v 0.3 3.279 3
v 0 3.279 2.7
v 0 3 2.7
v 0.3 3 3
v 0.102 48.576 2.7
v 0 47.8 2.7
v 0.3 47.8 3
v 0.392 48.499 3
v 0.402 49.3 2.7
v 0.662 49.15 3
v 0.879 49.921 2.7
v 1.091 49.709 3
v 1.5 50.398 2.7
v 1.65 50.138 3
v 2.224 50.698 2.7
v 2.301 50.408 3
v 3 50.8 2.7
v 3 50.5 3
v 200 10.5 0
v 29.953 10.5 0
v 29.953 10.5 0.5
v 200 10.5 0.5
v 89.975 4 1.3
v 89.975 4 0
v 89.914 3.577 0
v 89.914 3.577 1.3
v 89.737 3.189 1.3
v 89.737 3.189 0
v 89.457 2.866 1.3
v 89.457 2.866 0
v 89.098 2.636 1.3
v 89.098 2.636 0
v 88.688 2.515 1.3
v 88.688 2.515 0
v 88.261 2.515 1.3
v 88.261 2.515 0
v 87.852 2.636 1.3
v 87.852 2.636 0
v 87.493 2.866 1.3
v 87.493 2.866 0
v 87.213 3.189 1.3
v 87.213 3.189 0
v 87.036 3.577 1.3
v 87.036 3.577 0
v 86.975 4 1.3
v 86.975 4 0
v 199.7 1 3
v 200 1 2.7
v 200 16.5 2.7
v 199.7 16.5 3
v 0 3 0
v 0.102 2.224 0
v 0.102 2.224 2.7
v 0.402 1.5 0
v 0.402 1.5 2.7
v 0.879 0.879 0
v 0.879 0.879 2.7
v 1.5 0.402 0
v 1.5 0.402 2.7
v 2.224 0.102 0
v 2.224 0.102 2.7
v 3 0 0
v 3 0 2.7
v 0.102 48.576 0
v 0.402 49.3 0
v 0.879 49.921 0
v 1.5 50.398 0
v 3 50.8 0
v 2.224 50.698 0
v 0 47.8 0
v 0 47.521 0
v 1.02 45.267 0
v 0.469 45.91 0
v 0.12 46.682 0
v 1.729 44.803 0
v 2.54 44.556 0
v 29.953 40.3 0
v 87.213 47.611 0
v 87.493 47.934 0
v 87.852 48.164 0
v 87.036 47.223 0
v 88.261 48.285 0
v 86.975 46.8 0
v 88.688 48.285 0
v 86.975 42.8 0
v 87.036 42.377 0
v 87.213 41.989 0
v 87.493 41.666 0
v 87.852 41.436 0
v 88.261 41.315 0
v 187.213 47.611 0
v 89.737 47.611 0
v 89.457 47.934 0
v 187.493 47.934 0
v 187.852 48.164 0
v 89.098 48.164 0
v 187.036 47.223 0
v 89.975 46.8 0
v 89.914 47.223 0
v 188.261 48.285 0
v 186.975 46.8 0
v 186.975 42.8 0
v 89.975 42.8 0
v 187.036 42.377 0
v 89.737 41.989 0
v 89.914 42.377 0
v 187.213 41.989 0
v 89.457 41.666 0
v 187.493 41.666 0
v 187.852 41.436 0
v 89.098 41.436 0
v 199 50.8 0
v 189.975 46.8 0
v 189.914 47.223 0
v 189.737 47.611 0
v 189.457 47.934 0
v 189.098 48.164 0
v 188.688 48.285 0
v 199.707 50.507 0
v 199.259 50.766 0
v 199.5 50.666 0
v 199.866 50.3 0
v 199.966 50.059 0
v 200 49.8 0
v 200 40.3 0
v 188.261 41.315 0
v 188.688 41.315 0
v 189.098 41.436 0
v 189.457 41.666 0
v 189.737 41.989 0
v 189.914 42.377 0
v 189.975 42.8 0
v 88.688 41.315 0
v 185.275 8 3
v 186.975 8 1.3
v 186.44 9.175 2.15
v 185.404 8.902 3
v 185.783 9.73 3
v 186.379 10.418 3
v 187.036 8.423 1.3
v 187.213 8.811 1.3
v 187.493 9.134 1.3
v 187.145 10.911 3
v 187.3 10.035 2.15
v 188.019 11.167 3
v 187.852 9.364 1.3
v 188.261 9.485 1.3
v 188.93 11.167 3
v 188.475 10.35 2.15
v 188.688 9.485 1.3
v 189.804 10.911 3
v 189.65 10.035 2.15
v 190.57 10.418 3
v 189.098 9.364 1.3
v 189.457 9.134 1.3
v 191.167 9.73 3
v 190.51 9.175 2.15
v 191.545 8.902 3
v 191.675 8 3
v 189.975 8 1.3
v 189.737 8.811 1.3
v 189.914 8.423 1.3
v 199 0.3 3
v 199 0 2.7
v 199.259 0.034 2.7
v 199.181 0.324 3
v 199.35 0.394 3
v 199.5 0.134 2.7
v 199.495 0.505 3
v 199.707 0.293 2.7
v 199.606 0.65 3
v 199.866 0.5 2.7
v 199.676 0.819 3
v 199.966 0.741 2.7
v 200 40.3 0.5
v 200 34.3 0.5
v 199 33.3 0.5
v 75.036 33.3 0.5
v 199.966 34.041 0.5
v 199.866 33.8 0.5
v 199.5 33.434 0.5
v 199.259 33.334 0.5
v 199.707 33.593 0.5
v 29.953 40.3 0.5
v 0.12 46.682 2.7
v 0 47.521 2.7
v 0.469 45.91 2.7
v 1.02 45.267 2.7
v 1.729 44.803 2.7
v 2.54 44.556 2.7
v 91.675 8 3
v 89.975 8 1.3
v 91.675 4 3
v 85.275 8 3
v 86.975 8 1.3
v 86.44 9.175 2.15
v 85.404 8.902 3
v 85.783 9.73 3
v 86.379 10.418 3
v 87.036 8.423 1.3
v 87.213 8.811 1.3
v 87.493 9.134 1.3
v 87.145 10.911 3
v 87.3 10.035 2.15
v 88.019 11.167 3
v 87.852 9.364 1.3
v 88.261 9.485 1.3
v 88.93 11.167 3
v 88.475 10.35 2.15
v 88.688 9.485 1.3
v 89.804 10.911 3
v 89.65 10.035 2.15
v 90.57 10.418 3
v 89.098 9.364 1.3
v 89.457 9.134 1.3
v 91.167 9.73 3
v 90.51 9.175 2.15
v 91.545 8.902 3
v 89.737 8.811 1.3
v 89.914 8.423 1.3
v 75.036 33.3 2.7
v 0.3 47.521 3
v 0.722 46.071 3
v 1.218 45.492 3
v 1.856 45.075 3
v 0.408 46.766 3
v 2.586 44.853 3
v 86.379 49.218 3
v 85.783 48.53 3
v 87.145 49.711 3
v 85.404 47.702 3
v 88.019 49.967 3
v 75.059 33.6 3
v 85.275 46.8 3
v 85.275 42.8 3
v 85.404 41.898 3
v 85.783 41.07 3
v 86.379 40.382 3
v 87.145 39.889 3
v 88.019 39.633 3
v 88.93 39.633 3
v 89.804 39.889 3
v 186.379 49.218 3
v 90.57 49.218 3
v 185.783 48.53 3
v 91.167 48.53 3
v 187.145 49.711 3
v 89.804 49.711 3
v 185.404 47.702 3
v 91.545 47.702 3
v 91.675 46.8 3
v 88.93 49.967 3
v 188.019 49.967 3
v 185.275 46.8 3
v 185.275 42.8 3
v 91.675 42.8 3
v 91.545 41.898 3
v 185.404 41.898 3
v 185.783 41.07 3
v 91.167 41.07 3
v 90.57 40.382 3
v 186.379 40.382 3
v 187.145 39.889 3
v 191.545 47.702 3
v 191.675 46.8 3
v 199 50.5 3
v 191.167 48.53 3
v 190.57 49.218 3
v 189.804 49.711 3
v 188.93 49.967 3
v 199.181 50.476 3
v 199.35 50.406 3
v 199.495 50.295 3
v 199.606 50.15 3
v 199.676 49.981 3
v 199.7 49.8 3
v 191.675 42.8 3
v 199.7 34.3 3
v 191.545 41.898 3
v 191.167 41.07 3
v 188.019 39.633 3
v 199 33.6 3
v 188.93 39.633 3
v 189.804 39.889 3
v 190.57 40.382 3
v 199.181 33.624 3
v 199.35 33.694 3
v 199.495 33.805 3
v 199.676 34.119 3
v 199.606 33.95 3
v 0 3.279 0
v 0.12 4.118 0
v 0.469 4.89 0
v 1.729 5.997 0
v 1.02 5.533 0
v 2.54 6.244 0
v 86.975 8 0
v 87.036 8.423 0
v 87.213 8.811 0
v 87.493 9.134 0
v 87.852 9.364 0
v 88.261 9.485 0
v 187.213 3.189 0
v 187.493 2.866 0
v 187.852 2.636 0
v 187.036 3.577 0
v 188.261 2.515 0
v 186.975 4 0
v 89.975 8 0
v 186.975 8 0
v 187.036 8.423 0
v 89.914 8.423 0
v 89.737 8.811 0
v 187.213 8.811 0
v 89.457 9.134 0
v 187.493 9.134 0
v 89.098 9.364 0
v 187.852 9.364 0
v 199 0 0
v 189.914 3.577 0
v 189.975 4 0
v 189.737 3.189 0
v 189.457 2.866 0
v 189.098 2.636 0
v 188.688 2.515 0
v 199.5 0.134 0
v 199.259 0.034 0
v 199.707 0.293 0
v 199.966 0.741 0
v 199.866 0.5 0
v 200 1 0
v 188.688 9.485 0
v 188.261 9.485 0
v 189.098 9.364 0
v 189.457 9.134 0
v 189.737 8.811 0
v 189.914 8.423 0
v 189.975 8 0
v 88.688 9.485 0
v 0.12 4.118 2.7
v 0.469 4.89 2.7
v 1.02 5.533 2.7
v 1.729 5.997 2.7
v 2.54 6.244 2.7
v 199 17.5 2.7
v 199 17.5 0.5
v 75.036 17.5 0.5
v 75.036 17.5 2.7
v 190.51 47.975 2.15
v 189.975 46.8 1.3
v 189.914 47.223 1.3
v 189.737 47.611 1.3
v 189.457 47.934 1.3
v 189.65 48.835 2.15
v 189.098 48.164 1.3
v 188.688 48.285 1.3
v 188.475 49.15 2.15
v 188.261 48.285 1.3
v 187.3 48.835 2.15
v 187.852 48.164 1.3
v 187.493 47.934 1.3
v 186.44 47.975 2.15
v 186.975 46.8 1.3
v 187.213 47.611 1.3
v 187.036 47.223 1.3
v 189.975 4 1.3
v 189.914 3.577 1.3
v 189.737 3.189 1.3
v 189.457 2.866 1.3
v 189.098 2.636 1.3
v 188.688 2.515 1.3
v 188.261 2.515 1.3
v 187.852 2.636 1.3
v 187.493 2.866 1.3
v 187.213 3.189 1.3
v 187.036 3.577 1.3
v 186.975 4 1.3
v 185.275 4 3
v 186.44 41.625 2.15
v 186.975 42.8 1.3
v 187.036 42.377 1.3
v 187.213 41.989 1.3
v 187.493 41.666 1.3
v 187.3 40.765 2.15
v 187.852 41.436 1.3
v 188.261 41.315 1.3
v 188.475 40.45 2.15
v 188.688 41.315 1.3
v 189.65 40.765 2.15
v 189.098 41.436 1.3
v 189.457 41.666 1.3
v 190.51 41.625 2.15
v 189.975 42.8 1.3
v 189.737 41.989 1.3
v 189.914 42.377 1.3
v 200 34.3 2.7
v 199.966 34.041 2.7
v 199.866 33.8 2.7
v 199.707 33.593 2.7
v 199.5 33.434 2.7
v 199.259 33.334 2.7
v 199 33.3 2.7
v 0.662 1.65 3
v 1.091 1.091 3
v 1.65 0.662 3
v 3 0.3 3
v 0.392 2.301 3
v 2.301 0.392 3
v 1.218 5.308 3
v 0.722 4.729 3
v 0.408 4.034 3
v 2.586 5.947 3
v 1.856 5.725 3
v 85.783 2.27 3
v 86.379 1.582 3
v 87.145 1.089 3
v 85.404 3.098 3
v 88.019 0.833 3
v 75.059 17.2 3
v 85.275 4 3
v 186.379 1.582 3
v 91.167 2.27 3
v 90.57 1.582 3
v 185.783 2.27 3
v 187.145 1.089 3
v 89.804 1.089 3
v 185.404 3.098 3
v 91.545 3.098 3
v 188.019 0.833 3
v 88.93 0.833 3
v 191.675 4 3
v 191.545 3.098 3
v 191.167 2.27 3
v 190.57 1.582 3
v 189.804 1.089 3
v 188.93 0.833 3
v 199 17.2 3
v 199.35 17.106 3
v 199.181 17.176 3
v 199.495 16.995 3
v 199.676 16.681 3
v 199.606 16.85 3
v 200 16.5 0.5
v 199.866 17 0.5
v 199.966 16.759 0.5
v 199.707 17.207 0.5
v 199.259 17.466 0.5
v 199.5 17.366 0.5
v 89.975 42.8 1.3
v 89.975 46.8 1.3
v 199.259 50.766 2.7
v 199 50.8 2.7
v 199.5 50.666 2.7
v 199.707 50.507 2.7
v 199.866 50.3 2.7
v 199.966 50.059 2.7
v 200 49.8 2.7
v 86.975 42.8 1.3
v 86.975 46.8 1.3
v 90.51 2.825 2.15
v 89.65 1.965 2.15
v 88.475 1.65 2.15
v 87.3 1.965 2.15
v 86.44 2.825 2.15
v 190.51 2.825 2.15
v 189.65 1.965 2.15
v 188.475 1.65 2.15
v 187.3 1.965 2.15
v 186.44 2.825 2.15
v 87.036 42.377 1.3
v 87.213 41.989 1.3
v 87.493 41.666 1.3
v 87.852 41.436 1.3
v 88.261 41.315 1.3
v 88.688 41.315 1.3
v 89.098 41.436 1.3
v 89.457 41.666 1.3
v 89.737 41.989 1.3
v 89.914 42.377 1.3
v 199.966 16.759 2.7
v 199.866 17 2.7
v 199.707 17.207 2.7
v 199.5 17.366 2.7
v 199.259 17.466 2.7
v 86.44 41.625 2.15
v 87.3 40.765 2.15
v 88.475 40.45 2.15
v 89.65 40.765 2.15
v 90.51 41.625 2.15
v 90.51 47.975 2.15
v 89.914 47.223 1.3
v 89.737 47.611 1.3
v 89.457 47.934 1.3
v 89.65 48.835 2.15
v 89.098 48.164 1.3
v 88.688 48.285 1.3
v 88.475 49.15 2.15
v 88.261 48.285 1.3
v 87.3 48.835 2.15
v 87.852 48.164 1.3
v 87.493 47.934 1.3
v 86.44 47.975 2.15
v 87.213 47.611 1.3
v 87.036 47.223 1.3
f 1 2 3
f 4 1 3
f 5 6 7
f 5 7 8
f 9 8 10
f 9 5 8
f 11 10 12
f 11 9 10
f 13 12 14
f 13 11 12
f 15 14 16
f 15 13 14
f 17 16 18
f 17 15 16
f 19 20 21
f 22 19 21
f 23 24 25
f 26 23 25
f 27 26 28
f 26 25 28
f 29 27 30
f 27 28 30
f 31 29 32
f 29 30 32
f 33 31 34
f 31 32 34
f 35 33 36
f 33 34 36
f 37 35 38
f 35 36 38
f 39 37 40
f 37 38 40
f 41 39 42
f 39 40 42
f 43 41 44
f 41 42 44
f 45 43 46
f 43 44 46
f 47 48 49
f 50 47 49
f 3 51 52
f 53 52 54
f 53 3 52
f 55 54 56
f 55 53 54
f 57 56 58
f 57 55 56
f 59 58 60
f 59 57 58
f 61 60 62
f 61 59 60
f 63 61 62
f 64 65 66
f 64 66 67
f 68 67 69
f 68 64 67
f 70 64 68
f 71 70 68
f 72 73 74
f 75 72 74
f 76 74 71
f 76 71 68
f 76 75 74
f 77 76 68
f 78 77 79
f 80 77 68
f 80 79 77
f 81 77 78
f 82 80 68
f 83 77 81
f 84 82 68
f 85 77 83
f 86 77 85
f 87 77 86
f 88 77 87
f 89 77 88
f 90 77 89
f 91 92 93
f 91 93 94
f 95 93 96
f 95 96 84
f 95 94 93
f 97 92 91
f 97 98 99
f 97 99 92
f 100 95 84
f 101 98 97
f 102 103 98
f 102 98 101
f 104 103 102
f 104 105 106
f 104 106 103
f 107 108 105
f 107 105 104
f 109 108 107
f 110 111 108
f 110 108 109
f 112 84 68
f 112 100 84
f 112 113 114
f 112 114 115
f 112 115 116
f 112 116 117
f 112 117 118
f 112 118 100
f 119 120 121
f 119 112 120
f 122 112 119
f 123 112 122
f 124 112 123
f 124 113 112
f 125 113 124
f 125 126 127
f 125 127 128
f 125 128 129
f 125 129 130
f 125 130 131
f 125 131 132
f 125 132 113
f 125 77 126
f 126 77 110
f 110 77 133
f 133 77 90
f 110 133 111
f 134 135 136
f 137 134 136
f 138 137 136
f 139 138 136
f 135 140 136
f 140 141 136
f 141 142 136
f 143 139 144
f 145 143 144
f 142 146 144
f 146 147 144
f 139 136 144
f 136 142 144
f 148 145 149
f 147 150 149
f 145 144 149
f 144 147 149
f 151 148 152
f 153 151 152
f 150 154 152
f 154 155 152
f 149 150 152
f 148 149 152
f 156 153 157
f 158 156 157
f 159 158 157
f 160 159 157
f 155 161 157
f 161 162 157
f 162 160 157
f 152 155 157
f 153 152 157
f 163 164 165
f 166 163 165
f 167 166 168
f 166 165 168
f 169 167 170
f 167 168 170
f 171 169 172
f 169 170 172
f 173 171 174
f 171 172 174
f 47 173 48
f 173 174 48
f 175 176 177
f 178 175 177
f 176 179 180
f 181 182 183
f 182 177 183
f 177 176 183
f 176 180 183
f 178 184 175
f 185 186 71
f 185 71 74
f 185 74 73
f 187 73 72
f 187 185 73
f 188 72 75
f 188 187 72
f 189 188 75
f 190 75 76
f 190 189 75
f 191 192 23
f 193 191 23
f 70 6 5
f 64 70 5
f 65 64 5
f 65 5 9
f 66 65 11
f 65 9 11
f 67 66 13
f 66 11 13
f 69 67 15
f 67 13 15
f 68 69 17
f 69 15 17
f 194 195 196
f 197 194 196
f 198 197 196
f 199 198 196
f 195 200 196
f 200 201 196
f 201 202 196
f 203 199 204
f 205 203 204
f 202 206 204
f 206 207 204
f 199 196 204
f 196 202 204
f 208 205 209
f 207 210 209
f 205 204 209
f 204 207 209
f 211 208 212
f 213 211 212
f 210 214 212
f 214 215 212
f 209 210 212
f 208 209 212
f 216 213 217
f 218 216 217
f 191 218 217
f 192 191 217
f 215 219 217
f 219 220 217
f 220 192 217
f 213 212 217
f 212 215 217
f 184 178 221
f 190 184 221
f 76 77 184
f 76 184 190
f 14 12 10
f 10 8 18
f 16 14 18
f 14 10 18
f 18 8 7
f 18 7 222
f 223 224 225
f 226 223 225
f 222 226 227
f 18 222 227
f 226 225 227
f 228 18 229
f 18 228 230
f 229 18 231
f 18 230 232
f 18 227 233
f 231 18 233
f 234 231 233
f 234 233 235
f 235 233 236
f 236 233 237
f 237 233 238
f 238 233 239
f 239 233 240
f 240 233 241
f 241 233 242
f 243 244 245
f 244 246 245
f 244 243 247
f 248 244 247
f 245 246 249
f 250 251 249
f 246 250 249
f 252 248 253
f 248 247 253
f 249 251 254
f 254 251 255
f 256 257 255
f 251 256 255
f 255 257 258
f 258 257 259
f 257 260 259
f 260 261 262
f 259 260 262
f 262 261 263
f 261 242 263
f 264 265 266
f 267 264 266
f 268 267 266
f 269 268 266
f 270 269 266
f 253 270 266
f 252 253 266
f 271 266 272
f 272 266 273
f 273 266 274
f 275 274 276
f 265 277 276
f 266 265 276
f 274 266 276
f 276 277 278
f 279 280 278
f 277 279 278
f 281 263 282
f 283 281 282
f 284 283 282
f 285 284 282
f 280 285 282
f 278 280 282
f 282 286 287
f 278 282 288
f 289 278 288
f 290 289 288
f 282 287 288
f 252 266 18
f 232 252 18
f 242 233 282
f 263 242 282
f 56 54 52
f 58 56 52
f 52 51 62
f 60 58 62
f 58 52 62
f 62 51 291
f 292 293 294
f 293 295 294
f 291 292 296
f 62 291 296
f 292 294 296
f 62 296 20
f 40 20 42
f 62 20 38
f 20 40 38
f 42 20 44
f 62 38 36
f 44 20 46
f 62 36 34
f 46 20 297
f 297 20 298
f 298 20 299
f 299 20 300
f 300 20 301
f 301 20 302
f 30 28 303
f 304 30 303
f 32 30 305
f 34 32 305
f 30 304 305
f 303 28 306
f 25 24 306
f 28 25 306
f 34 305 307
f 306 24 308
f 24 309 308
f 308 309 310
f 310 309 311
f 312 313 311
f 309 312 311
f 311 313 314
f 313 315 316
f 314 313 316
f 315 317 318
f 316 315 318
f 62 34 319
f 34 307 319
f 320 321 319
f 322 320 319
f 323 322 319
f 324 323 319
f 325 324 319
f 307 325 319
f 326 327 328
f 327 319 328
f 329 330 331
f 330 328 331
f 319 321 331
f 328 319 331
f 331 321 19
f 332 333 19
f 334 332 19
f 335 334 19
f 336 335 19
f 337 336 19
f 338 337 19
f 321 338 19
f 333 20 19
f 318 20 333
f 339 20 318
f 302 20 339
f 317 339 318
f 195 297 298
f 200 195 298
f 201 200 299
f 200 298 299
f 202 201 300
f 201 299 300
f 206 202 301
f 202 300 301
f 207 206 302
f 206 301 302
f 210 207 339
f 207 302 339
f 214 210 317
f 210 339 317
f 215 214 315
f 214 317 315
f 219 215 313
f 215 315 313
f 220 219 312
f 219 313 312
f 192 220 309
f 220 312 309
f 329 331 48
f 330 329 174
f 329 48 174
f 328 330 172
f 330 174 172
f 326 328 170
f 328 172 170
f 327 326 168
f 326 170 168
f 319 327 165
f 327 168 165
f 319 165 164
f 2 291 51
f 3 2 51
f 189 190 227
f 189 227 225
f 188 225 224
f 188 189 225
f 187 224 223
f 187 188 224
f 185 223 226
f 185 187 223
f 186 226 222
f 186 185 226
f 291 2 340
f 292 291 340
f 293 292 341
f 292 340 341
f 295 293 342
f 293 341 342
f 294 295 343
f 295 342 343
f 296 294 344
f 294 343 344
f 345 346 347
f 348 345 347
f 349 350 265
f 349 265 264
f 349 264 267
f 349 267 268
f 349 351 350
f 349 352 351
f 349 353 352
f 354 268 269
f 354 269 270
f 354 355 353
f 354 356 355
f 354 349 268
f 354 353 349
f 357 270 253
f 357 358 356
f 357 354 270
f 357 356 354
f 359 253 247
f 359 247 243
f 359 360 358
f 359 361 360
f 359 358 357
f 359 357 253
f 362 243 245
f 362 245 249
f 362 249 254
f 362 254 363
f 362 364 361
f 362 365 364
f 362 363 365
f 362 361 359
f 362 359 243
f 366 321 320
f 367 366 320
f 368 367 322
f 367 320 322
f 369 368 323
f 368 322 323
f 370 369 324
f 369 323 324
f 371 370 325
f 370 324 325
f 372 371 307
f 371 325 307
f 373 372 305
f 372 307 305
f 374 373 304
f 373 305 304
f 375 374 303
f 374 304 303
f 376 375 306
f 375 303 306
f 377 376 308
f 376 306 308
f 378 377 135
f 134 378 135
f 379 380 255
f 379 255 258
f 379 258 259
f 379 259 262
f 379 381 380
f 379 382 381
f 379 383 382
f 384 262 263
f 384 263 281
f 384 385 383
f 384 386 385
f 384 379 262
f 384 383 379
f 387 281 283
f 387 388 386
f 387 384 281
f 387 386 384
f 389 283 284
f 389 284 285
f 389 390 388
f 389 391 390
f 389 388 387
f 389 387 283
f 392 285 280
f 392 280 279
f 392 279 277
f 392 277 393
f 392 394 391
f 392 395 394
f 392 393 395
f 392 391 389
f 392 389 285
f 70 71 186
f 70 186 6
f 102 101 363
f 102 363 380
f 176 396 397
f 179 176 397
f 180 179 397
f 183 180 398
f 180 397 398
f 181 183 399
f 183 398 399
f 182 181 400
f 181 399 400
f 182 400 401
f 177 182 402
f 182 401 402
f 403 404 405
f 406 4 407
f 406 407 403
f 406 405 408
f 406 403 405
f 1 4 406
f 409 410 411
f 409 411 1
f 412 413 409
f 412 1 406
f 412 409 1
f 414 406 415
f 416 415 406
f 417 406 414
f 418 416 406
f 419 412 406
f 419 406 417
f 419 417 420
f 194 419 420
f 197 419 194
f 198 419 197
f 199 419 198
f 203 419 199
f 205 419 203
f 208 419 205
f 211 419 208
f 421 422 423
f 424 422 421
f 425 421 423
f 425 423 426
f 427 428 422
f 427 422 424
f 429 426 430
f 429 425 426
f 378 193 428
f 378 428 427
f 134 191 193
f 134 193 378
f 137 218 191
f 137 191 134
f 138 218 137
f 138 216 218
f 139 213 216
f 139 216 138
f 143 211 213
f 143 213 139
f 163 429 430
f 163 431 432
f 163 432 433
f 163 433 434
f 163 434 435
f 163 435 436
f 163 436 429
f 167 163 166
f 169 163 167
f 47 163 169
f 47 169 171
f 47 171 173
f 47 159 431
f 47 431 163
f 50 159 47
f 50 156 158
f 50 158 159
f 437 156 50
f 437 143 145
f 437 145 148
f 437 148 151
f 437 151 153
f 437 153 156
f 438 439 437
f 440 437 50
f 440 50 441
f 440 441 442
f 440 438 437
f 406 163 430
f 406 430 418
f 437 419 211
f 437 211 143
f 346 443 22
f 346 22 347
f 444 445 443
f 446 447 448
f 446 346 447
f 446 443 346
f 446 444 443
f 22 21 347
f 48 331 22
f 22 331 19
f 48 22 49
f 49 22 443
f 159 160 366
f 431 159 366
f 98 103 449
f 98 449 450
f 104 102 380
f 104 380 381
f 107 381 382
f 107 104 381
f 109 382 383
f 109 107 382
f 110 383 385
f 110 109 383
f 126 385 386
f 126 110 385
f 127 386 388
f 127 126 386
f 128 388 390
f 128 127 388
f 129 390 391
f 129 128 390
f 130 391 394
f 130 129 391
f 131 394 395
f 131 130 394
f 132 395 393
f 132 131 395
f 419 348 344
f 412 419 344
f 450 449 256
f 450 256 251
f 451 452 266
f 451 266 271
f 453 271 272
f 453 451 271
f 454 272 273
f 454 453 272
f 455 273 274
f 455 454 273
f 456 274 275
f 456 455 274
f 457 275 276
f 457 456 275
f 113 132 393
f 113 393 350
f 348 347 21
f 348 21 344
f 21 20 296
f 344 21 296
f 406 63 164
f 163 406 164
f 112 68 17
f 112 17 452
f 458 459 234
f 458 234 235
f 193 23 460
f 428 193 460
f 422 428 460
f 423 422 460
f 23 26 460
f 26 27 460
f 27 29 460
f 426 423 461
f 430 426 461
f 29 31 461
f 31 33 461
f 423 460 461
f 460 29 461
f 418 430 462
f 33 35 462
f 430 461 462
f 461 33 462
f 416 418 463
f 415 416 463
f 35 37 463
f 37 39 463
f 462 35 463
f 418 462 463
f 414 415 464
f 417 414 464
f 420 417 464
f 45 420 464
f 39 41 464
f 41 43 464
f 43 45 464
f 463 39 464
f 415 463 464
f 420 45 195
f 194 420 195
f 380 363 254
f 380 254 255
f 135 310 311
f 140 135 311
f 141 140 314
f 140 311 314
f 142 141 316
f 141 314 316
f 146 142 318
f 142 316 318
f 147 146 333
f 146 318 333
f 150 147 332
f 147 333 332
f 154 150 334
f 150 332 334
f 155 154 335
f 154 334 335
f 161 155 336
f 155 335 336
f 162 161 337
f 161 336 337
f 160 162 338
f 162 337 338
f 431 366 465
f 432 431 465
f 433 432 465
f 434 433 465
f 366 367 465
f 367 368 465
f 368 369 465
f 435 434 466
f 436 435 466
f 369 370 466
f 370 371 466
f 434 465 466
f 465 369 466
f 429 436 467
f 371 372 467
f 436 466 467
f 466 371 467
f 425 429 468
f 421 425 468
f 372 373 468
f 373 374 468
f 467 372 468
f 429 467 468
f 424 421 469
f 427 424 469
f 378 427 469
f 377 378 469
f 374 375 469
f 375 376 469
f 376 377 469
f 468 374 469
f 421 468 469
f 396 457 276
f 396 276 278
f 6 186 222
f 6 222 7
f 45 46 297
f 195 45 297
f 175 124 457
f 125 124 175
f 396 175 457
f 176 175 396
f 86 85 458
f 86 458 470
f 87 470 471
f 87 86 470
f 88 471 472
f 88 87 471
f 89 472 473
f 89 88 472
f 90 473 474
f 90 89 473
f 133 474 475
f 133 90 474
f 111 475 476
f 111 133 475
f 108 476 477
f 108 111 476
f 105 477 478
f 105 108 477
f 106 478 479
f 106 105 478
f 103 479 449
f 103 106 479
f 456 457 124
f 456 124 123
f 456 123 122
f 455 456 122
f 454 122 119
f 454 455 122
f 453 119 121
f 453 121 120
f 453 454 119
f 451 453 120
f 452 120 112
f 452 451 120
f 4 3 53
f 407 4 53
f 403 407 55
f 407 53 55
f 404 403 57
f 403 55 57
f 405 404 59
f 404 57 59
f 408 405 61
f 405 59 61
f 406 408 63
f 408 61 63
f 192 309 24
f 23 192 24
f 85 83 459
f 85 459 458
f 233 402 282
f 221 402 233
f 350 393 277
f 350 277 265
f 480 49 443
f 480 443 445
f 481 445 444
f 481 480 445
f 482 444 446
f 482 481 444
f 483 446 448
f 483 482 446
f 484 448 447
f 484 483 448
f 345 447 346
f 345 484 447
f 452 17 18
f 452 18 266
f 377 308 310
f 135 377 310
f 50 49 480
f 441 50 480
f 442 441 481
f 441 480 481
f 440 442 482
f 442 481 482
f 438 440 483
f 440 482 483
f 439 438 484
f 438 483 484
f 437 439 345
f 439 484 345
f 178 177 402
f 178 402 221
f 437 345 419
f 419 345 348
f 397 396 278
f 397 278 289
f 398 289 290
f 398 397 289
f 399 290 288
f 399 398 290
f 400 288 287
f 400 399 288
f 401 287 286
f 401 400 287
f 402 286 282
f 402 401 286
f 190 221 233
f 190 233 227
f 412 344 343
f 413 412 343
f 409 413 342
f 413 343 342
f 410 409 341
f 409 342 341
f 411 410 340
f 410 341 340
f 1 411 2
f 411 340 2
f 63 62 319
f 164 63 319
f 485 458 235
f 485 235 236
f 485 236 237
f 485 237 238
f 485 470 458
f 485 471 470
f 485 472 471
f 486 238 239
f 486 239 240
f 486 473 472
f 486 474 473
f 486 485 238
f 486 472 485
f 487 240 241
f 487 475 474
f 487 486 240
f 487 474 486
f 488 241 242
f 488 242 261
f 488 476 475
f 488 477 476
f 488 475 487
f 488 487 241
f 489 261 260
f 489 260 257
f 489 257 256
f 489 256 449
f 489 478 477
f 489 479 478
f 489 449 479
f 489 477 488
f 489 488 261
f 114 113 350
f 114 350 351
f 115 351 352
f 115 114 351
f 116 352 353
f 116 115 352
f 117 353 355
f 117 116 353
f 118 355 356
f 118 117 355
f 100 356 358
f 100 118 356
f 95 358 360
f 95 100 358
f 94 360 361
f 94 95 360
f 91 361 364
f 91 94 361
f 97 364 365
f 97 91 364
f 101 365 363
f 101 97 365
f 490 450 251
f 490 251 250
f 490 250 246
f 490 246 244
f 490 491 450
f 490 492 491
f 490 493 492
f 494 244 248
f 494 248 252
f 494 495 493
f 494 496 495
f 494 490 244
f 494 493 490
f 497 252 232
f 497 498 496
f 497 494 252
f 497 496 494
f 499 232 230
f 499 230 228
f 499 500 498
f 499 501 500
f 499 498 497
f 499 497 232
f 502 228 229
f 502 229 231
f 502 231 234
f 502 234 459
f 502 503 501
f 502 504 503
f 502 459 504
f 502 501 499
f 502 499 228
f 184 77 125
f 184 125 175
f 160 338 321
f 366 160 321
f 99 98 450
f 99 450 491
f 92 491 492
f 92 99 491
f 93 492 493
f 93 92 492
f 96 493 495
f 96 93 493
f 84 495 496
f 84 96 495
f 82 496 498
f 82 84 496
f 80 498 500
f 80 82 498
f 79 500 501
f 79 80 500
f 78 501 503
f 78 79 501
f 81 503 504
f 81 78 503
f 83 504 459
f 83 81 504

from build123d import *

# Parameters (mm, degrees)
F1_DEPTH    = 3
F2_W        = 7
F2_H        = 0.5
F3_DEPTH    = 200.001
F6_R        = 3
F6_2_R      = 3
F8_R        = 1
F8_2_R      = 1
F9_SIZE     = 0.3
F9_2_SIZE   = 0.3
F10_SIZE2   = 1.7
F10_SIZE    = 1.7
F10_2_SIZE2 = 1.7
F10_2_SIZE  = 1.7


# Not quite as in the source:
# - two fillets or chamfers of one size are made in one step
# - a feature names something its author has since deleted; it is built from what else it names


with BuildPart() as f1:
    # F0 (on Top) → F1 (new body)
    with BuildSketch(Plane.XY):
        Polygon((0, 5.8492044918), (0, 0), (200, 0), (200, 17.5), (75.0357434154, 17.5), align=None)
        with BuildLine():
            Line((89.974817574, 8), (89.974817574, 4))
            ThreePointArc((89.974817574, 4), (88.474817574, 2.5), (86.974817574, 4))
            Line((86.974817574, 4), (86.974817574, 8))
            ThreePointArc((86.974817574, 8), (88.474817574, 9.5), (89.974817574, 8))
        make_face(mode=Mode.SUBTRACT)
        with BuildLine():
            Line((189.974817574, 8), (189.974817574, 4))
            ThreePointArc((189.974817574, 4), (188.474817574, 2.5), (186.974817574, 4))
            Line((186.974817574, 4), (186.974817574, 8))
            ThreePointArc((186.974817574, 8), (188.474817574, 9.5), (189.974817574, 8))
        make_face(mode=Mode.SUBTRACT)
    extrude(amount=F1_DEPTH)

    # F2 (on face) → F3 (cut, through all)
    with BuildSketch(Plane.YZ.offset(200)):
        with Locations((14, 0.25)):
            Rectangle(F2_W, F2_H)
    extrude(amount=-F3_DEPTH, mode=Mode.SUBTRACT)


with BuildPart() as f5_1:
    # F5: instance of F1
    add(f1.part.mirror(Plane(origin=(100, 25.4, 1.5), x_dir=(1, 0, 0), z_dir=(0, -1, 0))))

    # F6#2
    f6_2_edges = [f5_1.edges().sort_by_distance(p)[0] for p in [
        (0, 44.950796, 1.5),
        (0, 50.8, 1.5),
    ]]
    fillet(f6_2_edges, radius=F6_2_R)

    # F8#2
    f8_2_edges = [f5_1.edges().sort_by_distance(p)[0] for p in [
        (200, 50.8, 1.5),
        (200, 33.3, 1.75),
    ]]
    fillet(f8_2_edges, radius=F8_2_R)

    # F9#2
    f9_2_edges = [f5_1.edges().sort_by_distance(p)[0] for p in [
        (137.017872, 33.3, 3),
        (200, 42.05, 3),
        (199.707107, 50.507107, 3),
        (101, 50.8, 3),
        (38.787725, 38.928228, 3),
        (0.87868, 49.92132, 3),
        (0.721746, 45.569124, 3),
        (0, 47.660467, 3),
        (199.707107, 33.592893, 3),
    ]]
    chamfer(f9_2_edges, length=F9_2_SIZE)

    # F10#2
    f10_2_edges = [f5_1.edges().sort_by_distance(p)[0] for p in [
        (189.974818, 44.8, 3),
        (188.474818, 41.3, 3),
        (186.974818, 44.8, 3),
        (188.474818, 48.3, 3),
        (88.474818, 48.3, 3),
        (89.974818, 44.8, 3),
        (88.474818, 41.3, 3),
        (86.974818, 44.8, 3),
    ]]
    chamfer(f10_2_edges, length=F10_2_SIZE, length2=F10_2_SIZE2)


with BuildPart() as f1_1:
    add(f1.part)

    # F6
    f6_edges = [f1_1.edges().sort_by_distance(p)[0] for p in [
        (0, 5.849204, 1.5),
        (0, 0, 1.5),
    ]]
    fillet(f6_edges, radius=F6_R)

    # F8
    f8_edges = [f1_1.edges().sort_by_distance(p)[0] for p in [
        (200, 0, 1.5),
        (200, 17.5, 1.75),
    ]]
    fillet(f8_edges, radius=F8_R)

    # F9
    f9_edges = [f1_1.edges().sort_by_distance(p)[0] for p in [
        (137.017872, 17.5, 3),
        (200, 8.75, 3),
        (199.707107, 0.292893, 3),
        (101, 0, 3),
        (38.787725, 11.871772, 3),
        (0.87868, 0.87868, 3),
        (0.721746, 5.230876, 3),
        (0, 3.139533, 3),
        (199.707107, 17.207107, 3),
    ]]
    chamfer(f9_edges, length=F9_SIZE)

    # F10
    f10_edges = [f1_1.edges().sort_by_distance(p)[0] for p in [
        (89.974818, 6, 3),
        (88.474818, 9.5, 3),
        (86.974818, 6, 3),
        (88.474818, 2.5, 3),
        (188.474818, 9.5, 3),
        (189.974818, 6, 3),
        (188.474818, 2.5, 3),
        (186.974818, 6, 3),
    ]]
    chamfer(f10_edges, length=F10_SIZE, length2=F10_SIZE2)


solid = Compound([f5_1.part, f1_1.part])
